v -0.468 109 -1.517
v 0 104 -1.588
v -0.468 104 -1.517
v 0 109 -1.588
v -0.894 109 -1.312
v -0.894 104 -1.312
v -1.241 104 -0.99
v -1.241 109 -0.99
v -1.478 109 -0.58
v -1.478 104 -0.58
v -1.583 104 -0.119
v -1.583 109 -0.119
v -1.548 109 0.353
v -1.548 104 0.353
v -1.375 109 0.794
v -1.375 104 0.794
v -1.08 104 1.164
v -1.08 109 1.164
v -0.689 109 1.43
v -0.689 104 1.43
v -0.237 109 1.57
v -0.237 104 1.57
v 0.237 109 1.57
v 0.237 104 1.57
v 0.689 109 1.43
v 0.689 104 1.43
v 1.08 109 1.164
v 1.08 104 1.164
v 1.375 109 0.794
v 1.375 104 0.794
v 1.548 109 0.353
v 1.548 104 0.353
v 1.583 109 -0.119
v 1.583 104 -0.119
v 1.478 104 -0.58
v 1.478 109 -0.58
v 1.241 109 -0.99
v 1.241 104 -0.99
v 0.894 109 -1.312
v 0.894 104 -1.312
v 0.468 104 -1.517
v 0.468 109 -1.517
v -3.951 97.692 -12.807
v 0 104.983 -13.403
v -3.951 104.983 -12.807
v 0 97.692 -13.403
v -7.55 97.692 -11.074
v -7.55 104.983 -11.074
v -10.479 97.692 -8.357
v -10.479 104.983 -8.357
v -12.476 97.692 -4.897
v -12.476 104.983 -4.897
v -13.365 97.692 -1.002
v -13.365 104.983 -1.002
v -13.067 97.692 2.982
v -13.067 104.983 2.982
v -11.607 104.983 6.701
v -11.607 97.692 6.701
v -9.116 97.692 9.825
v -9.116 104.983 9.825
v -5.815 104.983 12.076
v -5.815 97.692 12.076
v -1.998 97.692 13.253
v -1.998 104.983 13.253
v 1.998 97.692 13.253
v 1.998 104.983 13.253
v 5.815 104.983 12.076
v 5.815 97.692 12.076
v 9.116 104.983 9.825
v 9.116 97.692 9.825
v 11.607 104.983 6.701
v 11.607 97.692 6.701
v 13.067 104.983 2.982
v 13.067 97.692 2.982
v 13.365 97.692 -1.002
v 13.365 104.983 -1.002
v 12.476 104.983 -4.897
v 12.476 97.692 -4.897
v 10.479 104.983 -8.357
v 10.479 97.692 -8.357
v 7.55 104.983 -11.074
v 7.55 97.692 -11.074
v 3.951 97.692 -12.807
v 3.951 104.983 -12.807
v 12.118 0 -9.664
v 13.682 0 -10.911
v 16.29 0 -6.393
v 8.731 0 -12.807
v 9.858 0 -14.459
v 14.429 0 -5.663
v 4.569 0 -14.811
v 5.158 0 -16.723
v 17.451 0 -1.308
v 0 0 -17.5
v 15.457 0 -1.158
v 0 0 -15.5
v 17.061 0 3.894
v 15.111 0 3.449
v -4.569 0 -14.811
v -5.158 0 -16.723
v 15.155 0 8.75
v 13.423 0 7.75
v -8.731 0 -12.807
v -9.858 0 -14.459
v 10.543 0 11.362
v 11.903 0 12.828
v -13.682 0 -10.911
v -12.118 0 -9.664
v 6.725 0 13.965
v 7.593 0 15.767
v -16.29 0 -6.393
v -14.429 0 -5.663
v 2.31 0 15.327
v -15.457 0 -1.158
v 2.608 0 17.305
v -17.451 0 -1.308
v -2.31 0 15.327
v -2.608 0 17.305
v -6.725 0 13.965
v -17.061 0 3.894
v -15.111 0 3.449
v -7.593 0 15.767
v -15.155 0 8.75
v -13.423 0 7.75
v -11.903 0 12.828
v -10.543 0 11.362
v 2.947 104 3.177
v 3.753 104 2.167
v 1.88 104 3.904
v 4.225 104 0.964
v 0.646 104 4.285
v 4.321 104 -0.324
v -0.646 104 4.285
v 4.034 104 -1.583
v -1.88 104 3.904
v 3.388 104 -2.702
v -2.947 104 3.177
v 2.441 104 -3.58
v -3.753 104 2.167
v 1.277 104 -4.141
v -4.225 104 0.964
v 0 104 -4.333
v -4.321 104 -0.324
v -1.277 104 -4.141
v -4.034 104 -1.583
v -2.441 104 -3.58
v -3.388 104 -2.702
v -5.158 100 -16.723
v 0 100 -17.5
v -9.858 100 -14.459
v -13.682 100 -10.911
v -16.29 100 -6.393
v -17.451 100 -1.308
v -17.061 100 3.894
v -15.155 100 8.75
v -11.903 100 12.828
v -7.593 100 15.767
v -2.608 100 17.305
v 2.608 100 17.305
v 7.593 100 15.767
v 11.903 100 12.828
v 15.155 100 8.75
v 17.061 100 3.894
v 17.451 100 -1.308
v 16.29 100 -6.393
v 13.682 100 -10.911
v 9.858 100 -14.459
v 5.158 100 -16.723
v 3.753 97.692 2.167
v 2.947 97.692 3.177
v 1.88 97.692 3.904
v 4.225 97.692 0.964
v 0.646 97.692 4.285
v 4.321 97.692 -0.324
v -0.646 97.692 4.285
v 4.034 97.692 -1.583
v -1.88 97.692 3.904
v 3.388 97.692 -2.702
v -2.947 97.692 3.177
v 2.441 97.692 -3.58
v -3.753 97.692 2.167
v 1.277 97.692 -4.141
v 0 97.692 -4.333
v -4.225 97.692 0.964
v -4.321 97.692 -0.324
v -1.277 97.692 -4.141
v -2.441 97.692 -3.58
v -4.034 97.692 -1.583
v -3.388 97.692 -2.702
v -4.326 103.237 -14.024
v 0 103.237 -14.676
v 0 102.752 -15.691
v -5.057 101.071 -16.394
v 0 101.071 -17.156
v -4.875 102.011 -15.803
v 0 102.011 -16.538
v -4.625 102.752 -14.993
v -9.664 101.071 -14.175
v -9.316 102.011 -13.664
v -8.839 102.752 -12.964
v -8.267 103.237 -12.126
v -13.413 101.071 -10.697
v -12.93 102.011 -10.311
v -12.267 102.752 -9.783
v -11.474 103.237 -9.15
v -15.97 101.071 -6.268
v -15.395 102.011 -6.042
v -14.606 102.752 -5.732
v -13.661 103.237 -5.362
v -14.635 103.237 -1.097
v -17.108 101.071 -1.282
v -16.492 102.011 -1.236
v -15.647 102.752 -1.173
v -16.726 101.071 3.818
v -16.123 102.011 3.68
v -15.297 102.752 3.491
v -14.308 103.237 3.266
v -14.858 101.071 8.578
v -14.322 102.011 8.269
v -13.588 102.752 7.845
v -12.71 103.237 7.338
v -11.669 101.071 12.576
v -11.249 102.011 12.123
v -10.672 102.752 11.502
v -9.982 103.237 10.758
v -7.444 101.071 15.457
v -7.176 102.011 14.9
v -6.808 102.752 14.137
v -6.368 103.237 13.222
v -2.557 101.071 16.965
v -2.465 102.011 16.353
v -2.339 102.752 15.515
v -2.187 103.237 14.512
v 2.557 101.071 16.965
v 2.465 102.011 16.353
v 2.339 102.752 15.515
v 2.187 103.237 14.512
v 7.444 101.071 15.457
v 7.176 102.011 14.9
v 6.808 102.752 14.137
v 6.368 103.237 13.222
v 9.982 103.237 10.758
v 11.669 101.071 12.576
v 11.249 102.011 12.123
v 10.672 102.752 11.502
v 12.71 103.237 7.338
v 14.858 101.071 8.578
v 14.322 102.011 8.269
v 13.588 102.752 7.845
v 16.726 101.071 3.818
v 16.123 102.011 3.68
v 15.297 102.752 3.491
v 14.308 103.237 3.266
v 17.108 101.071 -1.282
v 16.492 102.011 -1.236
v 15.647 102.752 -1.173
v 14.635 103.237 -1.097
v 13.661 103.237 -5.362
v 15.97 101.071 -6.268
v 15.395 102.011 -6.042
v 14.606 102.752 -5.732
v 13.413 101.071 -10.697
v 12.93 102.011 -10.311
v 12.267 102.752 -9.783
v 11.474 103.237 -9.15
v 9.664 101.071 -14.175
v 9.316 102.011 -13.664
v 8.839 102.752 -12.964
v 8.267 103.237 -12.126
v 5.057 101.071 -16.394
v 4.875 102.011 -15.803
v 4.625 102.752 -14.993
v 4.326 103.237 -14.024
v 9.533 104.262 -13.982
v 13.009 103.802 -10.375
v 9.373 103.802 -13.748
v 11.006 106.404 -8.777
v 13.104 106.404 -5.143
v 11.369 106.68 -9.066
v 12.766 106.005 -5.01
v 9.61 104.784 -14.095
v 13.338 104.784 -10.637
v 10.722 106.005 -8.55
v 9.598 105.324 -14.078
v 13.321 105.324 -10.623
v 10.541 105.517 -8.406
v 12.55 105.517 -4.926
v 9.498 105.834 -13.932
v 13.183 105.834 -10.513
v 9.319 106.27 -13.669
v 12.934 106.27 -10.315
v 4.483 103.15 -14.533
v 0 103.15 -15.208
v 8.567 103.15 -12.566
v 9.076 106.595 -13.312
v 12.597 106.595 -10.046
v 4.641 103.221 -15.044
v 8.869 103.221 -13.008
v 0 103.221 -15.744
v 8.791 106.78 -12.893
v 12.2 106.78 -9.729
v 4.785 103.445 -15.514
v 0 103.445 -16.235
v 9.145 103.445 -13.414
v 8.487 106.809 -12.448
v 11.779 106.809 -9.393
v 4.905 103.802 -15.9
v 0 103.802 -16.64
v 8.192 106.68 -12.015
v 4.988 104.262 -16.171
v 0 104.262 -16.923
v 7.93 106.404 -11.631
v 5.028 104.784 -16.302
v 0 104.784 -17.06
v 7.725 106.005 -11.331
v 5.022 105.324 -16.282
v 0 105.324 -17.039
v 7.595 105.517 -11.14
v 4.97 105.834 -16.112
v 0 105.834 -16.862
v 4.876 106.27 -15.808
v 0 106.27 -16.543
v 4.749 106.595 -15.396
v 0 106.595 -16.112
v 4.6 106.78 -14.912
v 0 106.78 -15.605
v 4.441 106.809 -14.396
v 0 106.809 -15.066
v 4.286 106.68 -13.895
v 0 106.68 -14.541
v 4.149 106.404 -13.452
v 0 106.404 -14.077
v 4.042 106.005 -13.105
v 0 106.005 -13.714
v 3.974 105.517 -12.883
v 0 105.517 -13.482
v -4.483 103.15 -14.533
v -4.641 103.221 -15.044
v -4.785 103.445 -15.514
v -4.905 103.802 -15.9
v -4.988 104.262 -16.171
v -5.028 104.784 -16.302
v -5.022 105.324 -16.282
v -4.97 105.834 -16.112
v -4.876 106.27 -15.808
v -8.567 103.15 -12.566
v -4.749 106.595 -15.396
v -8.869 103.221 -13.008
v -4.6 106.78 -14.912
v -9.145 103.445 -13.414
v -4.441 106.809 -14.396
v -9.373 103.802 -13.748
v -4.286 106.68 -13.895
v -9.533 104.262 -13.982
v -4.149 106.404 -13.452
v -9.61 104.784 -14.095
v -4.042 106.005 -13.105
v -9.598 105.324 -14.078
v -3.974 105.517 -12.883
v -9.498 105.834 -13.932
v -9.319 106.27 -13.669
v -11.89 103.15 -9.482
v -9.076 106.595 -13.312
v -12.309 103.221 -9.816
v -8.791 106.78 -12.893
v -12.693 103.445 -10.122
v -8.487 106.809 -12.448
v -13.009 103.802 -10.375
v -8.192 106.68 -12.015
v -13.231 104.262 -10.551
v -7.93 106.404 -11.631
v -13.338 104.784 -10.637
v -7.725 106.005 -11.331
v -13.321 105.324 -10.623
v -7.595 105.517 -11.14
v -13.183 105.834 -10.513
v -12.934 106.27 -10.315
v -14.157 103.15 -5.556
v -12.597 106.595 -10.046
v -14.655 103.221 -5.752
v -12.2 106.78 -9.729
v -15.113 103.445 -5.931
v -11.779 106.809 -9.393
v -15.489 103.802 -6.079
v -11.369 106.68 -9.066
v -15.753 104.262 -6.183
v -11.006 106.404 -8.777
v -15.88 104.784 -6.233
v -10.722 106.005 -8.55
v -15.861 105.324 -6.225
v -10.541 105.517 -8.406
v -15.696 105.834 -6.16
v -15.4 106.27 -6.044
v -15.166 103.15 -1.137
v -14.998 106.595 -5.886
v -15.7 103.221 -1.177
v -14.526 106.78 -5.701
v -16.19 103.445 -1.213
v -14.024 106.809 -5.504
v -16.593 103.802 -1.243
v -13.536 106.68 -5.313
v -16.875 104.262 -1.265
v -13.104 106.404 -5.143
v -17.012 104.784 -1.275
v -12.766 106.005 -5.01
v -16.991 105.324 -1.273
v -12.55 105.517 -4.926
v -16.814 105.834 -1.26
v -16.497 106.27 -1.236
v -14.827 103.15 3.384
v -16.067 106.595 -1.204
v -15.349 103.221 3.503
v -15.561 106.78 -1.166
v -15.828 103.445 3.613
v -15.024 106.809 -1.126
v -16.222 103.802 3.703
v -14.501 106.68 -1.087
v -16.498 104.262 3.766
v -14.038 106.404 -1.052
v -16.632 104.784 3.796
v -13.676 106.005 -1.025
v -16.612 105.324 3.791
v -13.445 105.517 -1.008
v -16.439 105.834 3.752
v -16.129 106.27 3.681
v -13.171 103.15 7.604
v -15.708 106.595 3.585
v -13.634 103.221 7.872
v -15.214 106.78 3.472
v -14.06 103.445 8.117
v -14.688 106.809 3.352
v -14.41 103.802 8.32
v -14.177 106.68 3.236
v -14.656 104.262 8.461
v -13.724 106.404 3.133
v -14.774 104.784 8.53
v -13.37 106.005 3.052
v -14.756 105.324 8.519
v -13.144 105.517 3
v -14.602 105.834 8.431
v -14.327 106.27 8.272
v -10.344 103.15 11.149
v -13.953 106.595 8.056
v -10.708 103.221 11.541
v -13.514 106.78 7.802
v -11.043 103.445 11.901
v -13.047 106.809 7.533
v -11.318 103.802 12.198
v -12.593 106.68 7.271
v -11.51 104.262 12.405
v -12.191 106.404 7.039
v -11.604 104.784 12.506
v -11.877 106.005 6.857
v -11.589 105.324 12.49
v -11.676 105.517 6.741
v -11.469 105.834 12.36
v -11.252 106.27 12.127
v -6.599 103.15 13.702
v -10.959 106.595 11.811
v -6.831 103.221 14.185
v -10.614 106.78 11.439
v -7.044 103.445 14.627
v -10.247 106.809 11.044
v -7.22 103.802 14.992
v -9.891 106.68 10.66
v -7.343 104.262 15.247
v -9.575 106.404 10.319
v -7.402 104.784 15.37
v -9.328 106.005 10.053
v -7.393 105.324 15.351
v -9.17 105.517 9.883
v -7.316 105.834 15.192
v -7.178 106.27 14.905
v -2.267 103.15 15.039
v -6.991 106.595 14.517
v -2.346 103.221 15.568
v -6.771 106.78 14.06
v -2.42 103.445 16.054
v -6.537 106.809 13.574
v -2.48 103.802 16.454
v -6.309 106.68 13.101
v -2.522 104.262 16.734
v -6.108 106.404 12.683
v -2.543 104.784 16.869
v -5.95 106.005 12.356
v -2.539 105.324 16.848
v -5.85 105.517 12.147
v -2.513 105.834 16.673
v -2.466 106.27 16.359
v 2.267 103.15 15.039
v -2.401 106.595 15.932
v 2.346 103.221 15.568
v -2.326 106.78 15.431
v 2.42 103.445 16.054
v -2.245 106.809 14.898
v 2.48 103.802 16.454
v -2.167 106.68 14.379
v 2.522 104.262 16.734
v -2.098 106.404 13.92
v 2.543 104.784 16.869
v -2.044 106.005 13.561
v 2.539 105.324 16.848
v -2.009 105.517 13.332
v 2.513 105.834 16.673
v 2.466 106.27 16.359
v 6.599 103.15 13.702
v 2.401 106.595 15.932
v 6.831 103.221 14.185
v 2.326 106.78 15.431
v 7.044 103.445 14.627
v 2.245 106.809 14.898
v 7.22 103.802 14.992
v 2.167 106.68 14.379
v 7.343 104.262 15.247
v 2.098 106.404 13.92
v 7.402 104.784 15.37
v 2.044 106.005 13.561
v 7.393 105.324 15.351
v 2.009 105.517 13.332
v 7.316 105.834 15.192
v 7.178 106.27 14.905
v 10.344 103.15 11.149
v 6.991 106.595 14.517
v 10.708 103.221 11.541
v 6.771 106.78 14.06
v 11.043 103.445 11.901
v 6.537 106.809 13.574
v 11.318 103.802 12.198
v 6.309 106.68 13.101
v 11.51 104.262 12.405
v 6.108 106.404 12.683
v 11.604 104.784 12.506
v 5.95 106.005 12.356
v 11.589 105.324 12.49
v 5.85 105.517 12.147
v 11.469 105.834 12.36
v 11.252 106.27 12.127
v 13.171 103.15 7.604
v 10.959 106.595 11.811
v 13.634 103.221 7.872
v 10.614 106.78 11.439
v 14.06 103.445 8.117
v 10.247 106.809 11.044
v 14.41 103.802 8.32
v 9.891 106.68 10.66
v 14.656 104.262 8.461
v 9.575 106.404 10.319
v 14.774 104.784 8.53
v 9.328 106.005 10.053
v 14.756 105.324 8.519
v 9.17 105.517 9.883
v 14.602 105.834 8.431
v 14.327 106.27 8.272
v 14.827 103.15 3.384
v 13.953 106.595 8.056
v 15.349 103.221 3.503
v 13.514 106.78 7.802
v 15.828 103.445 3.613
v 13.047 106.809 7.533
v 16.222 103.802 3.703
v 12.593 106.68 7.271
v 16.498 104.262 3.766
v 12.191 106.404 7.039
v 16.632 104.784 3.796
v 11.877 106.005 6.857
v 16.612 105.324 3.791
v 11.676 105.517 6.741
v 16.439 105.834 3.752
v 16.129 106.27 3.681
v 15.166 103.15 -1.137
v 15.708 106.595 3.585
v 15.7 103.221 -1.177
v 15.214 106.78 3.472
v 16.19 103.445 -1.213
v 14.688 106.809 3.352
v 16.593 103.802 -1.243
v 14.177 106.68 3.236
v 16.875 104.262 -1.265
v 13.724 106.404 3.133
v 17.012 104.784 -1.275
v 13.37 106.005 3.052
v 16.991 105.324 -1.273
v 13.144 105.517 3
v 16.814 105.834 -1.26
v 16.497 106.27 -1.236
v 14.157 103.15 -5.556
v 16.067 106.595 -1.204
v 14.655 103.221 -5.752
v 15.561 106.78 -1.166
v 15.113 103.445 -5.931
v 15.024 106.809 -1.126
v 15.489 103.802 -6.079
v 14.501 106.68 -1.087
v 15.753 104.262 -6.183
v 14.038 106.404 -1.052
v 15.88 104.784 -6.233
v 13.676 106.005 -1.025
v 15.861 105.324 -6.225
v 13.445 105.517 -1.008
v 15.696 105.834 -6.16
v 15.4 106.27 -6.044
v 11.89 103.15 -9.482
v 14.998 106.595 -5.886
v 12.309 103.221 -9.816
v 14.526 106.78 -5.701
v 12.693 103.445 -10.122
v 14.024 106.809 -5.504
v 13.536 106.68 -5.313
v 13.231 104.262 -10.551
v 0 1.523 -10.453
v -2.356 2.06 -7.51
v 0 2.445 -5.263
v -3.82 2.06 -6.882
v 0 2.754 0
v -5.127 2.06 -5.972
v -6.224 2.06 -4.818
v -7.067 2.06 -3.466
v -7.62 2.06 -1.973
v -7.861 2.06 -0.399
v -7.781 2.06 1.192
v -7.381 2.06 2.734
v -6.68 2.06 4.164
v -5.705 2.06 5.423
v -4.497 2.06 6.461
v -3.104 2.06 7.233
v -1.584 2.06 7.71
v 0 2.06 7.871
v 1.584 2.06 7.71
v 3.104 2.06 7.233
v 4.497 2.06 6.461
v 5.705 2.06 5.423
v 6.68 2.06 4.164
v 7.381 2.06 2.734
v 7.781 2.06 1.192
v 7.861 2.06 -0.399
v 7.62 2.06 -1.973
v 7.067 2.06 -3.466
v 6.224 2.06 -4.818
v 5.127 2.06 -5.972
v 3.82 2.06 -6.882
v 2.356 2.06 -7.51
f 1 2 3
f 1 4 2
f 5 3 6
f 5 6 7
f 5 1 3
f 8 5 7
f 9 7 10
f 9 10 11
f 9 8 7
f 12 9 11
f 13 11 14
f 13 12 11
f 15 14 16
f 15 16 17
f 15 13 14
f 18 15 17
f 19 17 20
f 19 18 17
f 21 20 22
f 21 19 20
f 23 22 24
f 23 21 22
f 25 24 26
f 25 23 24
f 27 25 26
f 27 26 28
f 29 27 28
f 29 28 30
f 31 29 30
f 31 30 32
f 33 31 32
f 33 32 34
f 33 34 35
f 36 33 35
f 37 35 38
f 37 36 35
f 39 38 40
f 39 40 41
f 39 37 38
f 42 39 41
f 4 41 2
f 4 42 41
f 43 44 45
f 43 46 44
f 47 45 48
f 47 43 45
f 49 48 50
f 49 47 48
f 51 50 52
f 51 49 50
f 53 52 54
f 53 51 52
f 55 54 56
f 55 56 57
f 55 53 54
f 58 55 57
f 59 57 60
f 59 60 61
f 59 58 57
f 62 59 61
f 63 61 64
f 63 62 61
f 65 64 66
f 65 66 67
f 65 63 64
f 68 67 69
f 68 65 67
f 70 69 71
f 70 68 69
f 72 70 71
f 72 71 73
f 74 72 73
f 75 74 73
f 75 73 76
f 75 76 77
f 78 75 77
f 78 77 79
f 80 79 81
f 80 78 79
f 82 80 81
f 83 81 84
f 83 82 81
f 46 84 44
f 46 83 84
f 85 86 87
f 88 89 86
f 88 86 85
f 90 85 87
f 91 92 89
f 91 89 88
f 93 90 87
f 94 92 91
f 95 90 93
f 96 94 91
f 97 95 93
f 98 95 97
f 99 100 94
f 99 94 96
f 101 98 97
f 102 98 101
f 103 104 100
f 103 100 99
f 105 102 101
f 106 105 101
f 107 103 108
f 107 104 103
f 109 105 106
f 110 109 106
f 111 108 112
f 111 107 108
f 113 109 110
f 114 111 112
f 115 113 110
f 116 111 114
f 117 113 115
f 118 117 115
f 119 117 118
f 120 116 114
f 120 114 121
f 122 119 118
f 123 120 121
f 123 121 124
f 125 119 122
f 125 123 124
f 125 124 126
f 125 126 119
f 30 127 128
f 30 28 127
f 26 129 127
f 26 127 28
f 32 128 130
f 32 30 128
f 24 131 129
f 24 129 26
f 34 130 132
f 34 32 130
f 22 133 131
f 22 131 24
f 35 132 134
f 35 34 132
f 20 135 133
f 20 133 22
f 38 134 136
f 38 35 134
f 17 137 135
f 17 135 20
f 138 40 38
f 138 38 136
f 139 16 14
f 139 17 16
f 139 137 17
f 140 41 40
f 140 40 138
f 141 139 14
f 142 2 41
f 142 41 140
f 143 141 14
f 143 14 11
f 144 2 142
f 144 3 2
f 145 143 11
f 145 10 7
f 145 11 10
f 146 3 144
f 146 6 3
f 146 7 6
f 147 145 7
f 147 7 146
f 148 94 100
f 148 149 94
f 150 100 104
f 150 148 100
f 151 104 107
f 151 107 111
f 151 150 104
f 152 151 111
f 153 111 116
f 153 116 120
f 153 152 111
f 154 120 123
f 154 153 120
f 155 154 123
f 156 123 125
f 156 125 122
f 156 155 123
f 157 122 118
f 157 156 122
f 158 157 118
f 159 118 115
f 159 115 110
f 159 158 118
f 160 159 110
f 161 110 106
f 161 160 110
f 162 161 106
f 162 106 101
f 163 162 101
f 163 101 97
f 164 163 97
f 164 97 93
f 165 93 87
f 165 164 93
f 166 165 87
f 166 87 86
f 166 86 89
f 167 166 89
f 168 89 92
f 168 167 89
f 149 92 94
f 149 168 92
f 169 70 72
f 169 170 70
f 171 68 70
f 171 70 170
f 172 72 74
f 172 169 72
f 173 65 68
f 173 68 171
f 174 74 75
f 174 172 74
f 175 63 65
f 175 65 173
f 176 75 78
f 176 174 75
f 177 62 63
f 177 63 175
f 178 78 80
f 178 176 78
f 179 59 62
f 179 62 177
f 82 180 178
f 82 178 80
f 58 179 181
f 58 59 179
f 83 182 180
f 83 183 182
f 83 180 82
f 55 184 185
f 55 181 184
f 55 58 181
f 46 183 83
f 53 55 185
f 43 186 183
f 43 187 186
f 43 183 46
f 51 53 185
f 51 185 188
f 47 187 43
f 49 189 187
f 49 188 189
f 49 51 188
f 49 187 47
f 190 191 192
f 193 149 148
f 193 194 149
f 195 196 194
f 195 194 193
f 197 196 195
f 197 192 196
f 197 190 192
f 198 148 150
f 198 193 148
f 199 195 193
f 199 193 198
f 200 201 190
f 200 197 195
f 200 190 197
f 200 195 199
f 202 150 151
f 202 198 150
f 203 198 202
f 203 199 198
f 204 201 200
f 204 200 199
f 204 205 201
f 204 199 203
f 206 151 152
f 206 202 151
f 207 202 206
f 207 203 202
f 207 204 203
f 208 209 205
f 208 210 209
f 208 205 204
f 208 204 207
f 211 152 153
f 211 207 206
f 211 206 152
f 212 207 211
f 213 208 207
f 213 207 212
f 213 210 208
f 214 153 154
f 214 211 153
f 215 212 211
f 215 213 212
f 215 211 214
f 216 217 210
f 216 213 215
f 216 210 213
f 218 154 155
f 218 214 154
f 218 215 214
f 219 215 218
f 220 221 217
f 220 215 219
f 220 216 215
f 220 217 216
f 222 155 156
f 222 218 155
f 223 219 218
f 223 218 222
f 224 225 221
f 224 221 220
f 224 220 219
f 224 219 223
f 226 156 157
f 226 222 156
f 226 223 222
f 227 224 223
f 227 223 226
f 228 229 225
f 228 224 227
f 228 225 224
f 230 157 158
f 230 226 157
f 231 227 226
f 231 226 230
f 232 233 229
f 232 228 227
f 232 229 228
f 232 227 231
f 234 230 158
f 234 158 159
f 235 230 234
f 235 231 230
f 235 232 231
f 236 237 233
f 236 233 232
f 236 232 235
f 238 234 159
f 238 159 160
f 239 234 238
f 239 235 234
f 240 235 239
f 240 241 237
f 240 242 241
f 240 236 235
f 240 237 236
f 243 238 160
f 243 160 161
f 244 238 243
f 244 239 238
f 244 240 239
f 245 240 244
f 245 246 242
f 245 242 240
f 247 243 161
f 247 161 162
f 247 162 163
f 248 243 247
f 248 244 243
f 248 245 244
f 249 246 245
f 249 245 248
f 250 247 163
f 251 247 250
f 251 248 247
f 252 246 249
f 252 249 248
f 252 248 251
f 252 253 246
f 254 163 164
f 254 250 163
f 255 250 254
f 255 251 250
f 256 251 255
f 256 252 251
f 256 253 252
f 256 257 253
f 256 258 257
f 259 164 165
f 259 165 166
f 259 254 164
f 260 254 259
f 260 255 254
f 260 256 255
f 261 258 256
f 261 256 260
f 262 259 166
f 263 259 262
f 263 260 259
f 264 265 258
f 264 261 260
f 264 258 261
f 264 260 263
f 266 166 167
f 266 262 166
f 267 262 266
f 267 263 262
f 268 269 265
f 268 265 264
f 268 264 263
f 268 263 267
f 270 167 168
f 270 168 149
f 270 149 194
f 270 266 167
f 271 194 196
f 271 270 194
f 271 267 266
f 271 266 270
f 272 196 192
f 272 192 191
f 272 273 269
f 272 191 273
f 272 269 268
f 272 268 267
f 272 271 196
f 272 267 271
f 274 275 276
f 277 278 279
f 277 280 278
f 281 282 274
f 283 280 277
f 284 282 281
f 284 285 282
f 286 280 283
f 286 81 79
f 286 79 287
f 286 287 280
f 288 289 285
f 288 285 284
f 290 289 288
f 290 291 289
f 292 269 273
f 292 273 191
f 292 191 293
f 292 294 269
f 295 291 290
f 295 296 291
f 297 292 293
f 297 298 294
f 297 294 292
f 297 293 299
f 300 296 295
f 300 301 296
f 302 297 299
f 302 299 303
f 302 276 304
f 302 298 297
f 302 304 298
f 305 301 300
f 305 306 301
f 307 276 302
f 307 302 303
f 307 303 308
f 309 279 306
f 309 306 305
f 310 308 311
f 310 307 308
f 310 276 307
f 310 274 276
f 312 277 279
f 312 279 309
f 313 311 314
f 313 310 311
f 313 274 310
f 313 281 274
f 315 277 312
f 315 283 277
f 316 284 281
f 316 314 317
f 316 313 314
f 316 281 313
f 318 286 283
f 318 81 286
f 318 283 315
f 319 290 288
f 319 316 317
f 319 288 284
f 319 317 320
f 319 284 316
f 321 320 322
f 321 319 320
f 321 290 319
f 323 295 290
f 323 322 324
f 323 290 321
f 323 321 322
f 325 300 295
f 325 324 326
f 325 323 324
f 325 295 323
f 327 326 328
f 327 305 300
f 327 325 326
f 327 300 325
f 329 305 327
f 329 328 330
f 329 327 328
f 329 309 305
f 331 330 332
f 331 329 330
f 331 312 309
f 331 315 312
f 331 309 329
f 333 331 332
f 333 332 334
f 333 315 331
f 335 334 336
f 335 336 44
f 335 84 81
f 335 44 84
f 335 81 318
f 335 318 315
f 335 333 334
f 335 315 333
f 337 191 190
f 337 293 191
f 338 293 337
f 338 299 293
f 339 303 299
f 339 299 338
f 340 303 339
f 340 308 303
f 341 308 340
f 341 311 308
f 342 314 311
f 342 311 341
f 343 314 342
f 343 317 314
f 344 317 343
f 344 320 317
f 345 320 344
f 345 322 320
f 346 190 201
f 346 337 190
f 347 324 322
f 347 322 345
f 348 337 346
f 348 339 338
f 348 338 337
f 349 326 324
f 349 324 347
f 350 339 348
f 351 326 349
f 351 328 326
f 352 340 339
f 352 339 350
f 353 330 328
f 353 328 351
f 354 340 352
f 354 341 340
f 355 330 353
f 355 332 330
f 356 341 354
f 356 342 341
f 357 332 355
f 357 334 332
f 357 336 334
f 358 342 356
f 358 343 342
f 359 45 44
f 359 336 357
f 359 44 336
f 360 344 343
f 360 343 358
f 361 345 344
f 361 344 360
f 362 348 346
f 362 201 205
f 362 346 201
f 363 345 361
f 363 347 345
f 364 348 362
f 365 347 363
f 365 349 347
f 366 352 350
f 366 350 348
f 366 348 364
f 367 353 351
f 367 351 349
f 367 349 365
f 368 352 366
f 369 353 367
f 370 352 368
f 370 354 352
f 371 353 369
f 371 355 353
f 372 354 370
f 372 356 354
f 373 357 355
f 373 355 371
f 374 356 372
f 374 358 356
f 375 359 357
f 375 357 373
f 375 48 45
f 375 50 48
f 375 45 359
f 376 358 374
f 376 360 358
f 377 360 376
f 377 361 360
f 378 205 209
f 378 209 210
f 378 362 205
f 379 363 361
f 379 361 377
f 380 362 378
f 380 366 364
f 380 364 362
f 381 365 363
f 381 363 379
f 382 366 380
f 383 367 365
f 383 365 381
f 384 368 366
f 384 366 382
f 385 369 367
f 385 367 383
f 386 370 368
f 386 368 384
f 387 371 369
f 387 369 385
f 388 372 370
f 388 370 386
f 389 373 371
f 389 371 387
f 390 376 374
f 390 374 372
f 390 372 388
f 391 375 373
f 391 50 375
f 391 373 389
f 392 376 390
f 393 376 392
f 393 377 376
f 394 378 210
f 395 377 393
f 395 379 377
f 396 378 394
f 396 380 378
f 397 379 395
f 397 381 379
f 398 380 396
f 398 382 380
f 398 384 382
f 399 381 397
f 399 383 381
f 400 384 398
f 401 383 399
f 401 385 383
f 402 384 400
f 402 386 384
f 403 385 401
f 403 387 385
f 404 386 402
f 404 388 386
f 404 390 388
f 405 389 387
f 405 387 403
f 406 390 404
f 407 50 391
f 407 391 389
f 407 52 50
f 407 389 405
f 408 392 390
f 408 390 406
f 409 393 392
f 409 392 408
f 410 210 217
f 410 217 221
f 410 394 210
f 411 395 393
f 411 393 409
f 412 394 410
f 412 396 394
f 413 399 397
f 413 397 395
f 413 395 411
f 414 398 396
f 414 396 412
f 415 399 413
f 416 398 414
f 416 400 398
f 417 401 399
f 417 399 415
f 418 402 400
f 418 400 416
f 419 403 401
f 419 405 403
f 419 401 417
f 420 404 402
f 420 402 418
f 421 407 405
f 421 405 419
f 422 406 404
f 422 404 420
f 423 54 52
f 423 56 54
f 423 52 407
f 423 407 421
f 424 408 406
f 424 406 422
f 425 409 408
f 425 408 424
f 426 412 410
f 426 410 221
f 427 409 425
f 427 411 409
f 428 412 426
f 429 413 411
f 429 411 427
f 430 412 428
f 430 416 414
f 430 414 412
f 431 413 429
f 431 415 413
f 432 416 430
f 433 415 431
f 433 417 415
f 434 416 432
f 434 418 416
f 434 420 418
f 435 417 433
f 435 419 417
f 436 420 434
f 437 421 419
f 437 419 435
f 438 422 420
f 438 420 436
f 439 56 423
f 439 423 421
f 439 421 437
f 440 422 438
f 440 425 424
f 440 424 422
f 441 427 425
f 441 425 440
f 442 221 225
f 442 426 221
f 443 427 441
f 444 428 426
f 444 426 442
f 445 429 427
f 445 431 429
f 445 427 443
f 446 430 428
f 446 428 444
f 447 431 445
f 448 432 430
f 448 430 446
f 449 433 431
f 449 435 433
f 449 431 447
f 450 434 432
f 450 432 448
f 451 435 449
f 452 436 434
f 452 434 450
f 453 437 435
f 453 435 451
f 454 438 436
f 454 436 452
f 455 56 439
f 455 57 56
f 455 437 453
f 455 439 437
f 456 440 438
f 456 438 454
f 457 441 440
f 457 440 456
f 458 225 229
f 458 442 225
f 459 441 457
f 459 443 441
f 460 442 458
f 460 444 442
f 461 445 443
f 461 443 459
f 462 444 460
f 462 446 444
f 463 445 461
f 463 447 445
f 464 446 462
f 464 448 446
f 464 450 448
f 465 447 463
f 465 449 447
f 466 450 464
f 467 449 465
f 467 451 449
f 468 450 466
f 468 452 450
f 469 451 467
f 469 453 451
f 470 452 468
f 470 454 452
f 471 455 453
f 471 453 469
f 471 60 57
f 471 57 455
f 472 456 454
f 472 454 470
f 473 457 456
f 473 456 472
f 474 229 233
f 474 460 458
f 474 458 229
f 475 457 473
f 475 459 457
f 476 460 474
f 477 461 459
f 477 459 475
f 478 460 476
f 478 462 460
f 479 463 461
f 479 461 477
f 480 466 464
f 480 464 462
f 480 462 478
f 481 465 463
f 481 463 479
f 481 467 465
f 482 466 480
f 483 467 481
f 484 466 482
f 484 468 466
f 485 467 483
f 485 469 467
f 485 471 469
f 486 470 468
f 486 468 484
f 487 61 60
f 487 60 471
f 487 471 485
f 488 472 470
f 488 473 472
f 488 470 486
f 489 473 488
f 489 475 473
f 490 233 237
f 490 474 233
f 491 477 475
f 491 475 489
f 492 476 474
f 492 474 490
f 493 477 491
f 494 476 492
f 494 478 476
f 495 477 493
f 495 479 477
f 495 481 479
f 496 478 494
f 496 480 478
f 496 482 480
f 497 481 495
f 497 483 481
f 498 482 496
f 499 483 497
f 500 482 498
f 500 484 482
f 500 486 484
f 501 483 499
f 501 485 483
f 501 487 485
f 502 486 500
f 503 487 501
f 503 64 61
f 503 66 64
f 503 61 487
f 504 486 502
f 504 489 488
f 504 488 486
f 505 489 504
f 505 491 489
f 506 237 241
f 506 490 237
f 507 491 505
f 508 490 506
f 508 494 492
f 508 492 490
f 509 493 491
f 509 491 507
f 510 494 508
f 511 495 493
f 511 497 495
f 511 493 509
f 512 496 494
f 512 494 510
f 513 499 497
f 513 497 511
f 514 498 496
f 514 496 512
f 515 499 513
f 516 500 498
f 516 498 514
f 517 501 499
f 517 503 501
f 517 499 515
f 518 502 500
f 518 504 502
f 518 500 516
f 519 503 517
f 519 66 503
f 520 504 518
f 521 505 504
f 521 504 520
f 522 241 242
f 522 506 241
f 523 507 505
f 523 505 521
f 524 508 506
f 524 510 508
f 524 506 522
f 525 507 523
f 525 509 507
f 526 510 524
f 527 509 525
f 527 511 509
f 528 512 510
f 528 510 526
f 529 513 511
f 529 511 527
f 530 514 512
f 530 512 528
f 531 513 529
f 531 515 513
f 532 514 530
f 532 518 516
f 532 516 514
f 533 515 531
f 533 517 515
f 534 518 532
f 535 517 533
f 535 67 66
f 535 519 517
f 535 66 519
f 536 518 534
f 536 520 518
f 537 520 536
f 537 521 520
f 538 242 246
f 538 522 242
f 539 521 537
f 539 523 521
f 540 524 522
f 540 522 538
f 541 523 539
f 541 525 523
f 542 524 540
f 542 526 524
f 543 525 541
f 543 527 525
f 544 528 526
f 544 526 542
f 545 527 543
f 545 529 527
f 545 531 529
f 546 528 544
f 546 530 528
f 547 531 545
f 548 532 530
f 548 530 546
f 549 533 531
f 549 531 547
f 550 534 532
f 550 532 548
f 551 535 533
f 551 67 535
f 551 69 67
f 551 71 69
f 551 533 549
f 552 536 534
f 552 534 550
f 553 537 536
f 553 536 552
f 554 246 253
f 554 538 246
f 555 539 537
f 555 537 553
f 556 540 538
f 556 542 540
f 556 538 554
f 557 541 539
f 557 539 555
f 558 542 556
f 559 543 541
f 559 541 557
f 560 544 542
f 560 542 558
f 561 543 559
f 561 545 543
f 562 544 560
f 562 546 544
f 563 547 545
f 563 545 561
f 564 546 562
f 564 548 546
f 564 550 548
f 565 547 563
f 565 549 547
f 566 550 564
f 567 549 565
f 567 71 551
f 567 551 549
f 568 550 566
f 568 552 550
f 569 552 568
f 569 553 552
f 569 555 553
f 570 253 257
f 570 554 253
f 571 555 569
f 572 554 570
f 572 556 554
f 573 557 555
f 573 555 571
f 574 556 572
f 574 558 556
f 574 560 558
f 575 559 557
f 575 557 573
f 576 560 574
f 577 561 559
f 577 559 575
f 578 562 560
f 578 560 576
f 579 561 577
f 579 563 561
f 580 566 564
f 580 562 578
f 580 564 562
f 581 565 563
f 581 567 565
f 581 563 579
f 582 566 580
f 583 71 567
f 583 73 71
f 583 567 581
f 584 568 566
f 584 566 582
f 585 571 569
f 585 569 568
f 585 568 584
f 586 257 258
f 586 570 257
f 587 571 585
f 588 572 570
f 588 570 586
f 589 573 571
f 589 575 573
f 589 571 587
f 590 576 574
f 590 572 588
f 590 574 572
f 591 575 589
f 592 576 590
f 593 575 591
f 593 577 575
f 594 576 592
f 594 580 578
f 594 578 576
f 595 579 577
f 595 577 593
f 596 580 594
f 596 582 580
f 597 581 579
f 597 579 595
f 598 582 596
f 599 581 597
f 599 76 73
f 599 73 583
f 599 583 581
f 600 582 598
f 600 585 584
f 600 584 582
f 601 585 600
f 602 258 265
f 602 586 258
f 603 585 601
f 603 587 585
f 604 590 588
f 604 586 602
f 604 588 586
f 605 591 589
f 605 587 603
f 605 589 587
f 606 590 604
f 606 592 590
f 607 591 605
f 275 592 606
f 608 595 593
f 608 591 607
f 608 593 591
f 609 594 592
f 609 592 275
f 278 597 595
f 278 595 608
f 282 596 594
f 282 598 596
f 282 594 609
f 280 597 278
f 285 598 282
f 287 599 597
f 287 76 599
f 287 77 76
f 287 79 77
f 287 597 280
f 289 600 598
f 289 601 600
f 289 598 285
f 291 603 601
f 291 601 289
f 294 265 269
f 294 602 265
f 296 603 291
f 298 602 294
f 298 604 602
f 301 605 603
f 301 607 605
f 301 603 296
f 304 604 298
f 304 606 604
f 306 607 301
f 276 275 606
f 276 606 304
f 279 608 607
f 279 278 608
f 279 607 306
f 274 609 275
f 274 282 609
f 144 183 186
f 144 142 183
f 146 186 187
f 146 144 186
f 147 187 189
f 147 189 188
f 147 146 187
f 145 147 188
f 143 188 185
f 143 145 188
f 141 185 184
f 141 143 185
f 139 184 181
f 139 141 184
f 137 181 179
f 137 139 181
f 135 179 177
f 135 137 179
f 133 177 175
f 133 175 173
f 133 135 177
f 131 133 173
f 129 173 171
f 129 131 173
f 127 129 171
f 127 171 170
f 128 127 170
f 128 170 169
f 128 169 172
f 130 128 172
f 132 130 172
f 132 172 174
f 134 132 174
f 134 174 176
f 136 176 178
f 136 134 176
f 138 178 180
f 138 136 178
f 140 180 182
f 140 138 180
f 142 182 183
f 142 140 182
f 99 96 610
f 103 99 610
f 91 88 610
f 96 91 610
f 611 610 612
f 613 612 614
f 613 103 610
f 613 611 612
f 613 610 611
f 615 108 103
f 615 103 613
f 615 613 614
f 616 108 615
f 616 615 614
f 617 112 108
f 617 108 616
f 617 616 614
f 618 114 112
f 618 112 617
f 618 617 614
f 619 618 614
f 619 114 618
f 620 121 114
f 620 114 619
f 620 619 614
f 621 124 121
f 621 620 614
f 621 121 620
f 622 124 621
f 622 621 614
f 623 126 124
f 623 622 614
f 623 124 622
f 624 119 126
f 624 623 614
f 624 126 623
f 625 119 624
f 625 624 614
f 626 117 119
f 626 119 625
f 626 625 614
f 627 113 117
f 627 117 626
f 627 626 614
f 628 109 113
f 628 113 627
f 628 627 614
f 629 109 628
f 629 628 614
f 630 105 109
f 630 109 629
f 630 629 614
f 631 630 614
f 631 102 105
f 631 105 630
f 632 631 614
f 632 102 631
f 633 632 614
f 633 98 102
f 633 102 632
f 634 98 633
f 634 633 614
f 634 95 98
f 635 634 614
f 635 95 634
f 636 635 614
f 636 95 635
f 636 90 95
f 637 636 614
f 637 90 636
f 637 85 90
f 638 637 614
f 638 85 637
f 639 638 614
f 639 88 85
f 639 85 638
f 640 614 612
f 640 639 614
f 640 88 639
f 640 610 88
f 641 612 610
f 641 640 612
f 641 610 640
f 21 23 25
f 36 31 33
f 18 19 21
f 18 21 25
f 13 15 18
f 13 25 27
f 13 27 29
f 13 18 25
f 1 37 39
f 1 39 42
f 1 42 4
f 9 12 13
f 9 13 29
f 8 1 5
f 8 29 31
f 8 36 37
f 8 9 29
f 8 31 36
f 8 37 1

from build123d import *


with BuildPart() as part:
    # Sketch1 → Revolve1 (revolve)
    with BuildSketch(Plane.XY, mode=Mode.PRIVATE) as revolve1_sk:
        with BuildLine():
            Line((-15.5, 0), (-17.5, 0))
            Line((-17.5, 0), (-17.5, 100))
            ThreePointArc((-17.5, 100), (-16.53803894, 102.011461655), (-14.675685538, 103.237425306))
            ThreePointArc((-14.675685538, 103.237425306), (-16.718615549, 106.063714958), (-13.402842077, 104.983380513))
            Line((-13.402842077, 104.983380513), (-13.402842077, 97.692354136))
            Line((-13.402842077, 97.692354136), (-4.333255578, 97.692354136))
            Line((-4.333255578, 97.692354136), (-4.333255578, 103.999749208))
            Line((-4.333255578, 103.999749208), (-1.5875, 103.999749208))
            Line((-1.5875, 103.999749208), (-1.5875, 108.999749208))
            Line((-1.5875, 108.999749208), (0, 108.999749208))
            Line((0, 108.999749208), (0, 2.753698387))
            ThreePointArc((0, 2.753698387), (-7.871353994, 2.059925785), (-15.5, 0))
        make_face()
    revolve(revolve1_sk.sketch.rotate(Axis((0, -1000, 0), (0, 1, 0)), 270), axis=Axis((0, -1000, 0), (0, 1, 0)))


solid = part.part
